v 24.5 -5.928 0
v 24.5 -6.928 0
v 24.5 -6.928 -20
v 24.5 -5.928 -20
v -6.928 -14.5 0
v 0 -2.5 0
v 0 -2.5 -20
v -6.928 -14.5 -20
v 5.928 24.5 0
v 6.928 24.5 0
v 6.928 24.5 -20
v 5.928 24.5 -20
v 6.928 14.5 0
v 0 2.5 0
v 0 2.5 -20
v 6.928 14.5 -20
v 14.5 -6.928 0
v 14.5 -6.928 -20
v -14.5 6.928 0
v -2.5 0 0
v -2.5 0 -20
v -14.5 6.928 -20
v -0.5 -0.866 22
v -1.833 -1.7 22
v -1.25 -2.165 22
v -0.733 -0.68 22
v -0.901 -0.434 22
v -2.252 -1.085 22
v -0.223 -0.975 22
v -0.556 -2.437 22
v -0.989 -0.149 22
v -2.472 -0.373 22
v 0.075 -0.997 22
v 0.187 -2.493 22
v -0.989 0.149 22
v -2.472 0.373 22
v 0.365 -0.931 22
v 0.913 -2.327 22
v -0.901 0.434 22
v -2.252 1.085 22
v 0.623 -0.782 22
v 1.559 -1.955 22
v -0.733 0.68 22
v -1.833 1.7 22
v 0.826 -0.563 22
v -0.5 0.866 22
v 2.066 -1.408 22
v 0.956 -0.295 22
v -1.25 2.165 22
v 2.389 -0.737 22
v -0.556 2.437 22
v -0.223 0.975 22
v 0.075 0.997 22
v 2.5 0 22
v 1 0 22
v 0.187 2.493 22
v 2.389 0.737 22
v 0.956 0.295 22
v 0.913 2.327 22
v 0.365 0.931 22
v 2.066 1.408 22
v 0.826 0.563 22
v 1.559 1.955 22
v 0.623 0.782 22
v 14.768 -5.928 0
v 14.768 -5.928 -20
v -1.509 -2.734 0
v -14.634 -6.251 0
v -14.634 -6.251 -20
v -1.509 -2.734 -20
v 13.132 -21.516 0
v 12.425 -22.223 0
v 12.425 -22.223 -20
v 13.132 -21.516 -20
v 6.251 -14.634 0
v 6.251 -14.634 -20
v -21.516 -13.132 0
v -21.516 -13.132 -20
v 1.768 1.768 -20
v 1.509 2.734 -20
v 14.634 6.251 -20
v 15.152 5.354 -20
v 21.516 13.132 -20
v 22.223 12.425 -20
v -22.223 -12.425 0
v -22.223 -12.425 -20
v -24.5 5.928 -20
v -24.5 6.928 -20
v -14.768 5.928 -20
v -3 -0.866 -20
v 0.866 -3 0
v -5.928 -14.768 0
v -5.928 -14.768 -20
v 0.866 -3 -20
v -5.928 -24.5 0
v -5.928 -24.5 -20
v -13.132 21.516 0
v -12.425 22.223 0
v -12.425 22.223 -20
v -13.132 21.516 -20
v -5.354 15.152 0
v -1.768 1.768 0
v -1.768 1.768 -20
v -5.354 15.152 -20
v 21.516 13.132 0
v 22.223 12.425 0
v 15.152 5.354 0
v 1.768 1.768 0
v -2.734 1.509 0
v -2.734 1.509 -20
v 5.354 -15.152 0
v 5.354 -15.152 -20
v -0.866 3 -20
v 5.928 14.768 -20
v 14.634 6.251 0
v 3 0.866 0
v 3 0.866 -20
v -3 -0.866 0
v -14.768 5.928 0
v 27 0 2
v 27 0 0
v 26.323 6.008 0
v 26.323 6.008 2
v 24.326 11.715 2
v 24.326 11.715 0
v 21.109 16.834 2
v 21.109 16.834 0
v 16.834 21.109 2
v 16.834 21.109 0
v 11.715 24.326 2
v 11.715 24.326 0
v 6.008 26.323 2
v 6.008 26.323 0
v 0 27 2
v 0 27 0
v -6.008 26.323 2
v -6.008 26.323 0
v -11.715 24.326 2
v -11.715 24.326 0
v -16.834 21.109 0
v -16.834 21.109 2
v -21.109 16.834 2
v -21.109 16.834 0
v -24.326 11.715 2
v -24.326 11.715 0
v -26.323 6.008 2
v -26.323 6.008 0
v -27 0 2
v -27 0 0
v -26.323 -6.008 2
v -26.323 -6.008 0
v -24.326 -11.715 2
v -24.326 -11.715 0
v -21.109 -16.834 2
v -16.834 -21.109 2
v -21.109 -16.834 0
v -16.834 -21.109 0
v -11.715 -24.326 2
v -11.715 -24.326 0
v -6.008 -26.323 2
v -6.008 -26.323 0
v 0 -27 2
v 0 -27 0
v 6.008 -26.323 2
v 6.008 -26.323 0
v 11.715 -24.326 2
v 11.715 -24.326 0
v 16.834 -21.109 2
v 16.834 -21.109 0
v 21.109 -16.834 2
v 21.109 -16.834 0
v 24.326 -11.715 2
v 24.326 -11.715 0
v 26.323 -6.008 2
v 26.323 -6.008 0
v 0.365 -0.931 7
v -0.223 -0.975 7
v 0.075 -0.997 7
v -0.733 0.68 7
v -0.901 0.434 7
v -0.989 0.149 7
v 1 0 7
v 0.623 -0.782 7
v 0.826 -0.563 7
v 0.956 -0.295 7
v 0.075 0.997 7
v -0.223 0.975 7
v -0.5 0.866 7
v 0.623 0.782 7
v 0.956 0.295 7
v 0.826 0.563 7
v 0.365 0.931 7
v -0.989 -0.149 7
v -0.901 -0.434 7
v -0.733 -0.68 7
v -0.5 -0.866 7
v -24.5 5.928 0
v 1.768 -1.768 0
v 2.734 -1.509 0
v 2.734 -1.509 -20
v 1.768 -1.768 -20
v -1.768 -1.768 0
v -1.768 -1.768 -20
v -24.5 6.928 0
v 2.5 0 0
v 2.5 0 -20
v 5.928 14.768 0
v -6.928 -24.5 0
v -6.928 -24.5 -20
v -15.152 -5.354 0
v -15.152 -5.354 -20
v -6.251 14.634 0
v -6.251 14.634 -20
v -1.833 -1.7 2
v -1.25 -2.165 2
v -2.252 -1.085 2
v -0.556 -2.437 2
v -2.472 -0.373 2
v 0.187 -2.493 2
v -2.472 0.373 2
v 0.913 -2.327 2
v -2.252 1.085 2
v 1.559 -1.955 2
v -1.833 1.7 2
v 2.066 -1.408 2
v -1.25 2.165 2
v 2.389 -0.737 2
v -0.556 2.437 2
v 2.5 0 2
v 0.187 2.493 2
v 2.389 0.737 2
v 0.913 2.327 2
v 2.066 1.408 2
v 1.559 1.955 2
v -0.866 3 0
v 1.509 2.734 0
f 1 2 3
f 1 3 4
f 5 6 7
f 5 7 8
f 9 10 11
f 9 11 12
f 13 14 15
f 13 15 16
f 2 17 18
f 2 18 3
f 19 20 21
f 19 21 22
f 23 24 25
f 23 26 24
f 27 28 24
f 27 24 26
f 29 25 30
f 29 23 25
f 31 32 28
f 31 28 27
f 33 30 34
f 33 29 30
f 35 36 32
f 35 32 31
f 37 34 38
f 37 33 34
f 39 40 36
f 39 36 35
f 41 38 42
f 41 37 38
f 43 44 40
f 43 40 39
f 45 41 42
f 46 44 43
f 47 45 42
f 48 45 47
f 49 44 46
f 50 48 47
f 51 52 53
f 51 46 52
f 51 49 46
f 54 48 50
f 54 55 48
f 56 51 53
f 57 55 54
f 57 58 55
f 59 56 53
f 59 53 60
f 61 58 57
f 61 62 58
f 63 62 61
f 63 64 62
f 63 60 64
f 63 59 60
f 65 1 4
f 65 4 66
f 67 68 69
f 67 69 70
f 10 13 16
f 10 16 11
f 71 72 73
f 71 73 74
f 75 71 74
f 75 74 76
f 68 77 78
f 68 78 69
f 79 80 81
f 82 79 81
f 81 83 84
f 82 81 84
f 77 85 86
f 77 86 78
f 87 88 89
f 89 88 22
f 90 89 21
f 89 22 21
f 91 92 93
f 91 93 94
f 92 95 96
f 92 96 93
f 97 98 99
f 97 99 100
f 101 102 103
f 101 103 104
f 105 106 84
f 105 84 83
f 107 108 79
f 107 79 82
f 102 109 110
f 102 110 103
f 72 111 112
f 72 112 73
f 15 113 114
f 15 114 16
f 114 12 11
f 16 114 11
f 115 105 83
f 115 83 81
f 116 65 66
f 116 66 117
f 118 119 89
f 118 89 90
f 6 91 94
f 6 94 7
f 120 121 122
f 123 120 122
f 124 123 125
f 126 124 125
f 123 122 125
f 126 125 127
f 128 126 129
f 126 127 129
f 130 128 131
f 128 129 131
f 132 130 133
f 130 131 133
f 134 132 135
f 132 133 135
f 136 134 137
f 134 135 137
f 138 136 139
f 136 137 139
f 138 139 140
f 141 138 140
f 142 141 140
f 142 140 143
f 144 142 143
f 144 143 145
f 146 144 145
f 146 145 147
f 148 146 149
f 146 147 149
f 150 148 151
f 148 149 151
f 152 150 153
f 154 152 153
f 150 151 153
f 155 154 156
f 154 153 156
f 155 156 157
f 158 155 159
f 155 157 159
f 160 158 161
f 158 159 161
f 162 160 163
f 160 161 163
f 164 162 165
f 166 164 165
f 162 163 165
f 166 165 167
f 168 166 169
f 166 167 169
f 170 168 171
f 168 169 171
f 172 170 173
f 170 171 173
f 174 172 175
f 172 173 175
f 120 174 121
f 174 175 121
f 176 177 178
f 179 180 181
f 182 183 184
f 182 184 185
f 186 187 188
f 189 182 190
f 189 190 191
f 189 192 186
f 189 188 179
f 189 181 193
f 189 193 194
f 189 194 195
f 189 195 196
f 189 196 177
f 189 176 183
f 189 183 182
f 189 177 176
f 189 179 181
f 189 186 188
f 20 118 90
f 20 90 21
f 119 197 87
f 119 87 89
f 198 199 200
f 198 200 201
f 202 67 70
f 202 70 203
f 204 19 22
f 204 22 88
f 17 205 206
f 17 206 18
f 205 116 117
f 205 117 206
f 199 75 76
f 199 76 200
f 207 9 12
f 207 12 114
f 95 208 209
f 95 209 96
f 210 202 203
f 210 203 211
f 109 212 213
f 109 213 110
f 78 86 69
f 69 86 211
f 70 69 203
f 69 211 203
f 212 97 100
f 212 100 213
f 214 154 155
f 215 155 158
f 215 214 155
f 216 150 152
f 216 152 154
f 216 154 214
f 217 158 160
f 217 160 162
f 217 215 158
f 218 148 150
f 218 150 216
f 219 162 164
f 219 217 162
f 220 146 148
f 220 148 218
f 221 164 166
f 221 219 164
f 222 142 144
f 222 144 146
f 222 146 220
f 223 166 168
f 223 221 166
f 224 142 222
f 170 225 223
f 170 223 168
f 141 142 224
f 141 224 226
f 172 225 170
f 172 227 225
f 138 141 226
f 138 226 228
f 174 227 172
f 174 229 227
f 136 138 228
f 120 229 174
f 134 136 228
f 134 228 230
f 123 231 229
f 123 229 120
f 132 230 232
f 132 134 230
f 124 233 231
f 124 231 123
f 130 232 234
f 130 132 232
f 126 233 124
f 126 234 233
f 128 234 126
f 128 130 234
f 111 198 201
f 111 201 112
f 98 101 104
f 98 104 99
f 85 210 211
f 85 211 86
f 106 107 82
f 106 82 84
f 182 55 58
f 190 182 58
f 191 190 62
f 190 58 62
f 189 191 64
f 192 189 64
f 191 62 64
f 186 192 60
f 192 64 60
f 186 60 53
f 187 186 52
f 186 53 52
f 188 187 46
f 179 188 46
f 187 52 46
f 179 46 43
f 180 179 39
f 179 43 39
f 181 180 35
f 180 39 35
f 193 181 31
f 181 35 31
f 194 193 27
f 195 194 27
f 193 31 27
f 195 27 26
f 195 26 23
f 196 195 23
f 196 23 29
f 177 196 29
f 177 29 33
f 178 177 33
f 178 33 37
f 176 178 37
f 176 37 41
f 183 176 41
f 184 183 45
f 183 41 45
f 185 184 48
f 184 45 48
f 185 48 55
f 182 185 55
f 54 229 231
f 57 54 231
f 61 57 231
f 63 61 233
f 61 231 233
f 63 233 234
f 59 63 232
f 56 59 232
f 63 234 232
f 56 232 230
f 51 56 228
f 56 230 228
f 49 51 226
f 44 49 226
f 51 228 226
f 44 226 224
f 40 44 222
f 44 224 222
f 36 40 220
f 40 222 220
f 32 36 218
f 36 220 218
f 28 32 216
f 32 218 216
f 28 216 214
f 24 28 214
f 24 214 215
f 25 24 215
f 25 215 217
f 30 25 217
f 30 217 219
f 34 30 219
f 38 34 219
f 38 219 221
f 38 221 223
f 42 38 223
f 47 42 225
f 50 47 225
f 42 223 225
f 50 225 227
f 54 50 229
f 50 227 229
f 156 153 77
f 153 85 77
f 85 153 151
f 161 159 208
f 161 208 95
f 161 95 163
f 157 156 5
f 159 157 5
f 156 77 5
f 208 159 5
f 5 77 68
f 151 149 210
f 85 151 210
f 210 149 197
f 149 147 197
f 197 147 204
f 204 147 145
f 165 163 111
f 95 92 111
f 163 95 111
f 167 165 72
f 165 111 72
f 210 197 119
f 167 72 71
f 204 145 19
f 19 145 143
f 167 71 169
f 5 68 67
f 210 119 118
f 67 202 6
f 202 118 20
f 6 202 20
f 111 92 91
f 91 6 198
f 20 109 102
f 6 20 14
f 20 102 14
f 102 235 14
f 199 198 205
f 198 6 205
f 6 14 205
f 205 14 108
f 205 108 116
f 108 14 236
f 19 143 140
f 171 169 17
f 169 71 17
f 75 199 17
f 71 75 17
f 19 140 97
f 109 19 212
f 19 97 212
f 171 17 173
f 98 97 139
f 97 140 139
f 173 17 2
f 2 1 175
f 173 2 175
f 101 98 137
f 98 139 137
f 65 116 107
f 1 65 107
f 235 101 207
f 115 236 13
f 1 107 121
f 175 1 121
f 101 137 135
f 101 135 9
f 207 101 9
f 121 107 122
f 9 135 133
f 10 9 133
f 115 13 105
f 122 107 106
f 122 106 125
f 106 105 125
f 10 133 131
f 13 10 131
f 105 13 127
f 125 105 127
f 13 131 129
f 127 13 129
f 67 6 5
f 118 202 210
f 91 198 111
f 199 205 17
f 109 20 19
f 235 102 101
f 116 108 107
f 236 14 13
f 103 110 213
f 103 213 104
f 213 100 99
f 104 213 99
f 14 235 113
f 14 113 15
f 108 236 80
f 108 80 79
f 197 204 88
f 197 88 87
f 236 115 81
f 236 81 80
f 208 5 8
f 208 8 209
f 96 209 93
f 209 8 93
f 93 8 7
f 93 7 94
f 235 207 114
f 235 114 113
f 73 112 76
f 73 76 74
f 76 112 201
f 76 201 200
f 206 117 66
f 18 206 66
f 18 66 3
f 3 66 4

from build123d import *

# Parameters (mm, degrees)
SKETCH_1_R          = 27
EXTRUDE_1_DEPTH     = 2
EXTRUDE_2_DEPTH     = 20
SKETCH_3_R          = 2.5
EXTRUDE_3_DEPTH     = 20
SKETCH_4_R          = 1
CUT_EXTRUDE_1_DEPTH = 15


with BuildPart() as part:
    # 草图1 → 凸台-拉伸1 (new body)
    with BuildSketch(Plane.XY):
        Circle(SKETCH_1_R)
    extrude(amount=EXTRUDE_1_DEPTH)

    # 草图2 → 凸台-拉伸2 (add)
    with BuildSketch(Plane.XY):
        Polygon((-2.5, 0), (-14.5, 6.92820323), (-24.5, 6.92820323), (-24.5, 5.92820323), (-14.767949192, 5.92820323), (-3, -0.866025404), align=None)
        Polygon((-12.425136654, 22.223095625), (-13.132243435, 21.515988843), (-6.250644314, 14.634389723), (-2.733692779, 1.508947908), (-1.767766953, 1.767766953), (-5.354068842, 15.152027813), align=None)
        Polygon((6.92820323, 24.5), (5.92820323, 24.5), (5.92820323, 14.767949192), (-0.866025404, 3), (0, 2.5), (6.92820323, 14.5), align=None)
        Polygon((22.223095625, 12.425136654), (21.515988843, 13.132243435), (14.634389723, 6.250644314), (1.508947908, 2.733692779), (1.767766953, 1.767766953), (15.152027813, 5.354068842), align=None)
        Polygon((24.5, -6.92820323), (24.5, -5.92820323), (14.767949192, -5.92820323), (3, 0.866025404), (2.5, 0), (14.5, -6.92820323), align=None)
        Polygon((12.425136654, -22.223095625), (13.132243435, -21.515988843), (6.250644314, -14.634389723), (2.733692779, -1.508947908), (1.767766953, -1.767766953), (5.354068842, -15.152027813), align=None)
        Polygon((-6.92820323, -24.5), (-5.92820323, -24.5), (-5.92820323, -14.767949192), (0.866025404, -3), (0, -2.5), (-6.92820323, -14.5), align=None)
        Polygon((-22.223095625, -12.425136654), (-21.515988843, -13.132243435), (-14.634389723, -6.250644314), (-1.508947908, -2.733692779), (-1.767766953, -1.767766953), (-15.152027813, -5.354068842), align=None)
    extrude(amount=-EXTRUDE_2_DEPTH)

    # 草图3 → 凸台-拉伸3 (add)
    with BuildSketch(Plane.XY.offset(2)):
        Circle(SKETCH_3_R)
    extrude(amount=EXTRUDE_3_DEPTH)

    # 草图4 → 切除-拉伸1 (cut)
    with BuildSketch(Plane.XY.offset(22)):
        Circle(SKETCH_4_R)
    extrude(amount=-CUT_EXTRUDE_1_DEPTH, mode=Mode.SUBTRACT)


solid = part.part
